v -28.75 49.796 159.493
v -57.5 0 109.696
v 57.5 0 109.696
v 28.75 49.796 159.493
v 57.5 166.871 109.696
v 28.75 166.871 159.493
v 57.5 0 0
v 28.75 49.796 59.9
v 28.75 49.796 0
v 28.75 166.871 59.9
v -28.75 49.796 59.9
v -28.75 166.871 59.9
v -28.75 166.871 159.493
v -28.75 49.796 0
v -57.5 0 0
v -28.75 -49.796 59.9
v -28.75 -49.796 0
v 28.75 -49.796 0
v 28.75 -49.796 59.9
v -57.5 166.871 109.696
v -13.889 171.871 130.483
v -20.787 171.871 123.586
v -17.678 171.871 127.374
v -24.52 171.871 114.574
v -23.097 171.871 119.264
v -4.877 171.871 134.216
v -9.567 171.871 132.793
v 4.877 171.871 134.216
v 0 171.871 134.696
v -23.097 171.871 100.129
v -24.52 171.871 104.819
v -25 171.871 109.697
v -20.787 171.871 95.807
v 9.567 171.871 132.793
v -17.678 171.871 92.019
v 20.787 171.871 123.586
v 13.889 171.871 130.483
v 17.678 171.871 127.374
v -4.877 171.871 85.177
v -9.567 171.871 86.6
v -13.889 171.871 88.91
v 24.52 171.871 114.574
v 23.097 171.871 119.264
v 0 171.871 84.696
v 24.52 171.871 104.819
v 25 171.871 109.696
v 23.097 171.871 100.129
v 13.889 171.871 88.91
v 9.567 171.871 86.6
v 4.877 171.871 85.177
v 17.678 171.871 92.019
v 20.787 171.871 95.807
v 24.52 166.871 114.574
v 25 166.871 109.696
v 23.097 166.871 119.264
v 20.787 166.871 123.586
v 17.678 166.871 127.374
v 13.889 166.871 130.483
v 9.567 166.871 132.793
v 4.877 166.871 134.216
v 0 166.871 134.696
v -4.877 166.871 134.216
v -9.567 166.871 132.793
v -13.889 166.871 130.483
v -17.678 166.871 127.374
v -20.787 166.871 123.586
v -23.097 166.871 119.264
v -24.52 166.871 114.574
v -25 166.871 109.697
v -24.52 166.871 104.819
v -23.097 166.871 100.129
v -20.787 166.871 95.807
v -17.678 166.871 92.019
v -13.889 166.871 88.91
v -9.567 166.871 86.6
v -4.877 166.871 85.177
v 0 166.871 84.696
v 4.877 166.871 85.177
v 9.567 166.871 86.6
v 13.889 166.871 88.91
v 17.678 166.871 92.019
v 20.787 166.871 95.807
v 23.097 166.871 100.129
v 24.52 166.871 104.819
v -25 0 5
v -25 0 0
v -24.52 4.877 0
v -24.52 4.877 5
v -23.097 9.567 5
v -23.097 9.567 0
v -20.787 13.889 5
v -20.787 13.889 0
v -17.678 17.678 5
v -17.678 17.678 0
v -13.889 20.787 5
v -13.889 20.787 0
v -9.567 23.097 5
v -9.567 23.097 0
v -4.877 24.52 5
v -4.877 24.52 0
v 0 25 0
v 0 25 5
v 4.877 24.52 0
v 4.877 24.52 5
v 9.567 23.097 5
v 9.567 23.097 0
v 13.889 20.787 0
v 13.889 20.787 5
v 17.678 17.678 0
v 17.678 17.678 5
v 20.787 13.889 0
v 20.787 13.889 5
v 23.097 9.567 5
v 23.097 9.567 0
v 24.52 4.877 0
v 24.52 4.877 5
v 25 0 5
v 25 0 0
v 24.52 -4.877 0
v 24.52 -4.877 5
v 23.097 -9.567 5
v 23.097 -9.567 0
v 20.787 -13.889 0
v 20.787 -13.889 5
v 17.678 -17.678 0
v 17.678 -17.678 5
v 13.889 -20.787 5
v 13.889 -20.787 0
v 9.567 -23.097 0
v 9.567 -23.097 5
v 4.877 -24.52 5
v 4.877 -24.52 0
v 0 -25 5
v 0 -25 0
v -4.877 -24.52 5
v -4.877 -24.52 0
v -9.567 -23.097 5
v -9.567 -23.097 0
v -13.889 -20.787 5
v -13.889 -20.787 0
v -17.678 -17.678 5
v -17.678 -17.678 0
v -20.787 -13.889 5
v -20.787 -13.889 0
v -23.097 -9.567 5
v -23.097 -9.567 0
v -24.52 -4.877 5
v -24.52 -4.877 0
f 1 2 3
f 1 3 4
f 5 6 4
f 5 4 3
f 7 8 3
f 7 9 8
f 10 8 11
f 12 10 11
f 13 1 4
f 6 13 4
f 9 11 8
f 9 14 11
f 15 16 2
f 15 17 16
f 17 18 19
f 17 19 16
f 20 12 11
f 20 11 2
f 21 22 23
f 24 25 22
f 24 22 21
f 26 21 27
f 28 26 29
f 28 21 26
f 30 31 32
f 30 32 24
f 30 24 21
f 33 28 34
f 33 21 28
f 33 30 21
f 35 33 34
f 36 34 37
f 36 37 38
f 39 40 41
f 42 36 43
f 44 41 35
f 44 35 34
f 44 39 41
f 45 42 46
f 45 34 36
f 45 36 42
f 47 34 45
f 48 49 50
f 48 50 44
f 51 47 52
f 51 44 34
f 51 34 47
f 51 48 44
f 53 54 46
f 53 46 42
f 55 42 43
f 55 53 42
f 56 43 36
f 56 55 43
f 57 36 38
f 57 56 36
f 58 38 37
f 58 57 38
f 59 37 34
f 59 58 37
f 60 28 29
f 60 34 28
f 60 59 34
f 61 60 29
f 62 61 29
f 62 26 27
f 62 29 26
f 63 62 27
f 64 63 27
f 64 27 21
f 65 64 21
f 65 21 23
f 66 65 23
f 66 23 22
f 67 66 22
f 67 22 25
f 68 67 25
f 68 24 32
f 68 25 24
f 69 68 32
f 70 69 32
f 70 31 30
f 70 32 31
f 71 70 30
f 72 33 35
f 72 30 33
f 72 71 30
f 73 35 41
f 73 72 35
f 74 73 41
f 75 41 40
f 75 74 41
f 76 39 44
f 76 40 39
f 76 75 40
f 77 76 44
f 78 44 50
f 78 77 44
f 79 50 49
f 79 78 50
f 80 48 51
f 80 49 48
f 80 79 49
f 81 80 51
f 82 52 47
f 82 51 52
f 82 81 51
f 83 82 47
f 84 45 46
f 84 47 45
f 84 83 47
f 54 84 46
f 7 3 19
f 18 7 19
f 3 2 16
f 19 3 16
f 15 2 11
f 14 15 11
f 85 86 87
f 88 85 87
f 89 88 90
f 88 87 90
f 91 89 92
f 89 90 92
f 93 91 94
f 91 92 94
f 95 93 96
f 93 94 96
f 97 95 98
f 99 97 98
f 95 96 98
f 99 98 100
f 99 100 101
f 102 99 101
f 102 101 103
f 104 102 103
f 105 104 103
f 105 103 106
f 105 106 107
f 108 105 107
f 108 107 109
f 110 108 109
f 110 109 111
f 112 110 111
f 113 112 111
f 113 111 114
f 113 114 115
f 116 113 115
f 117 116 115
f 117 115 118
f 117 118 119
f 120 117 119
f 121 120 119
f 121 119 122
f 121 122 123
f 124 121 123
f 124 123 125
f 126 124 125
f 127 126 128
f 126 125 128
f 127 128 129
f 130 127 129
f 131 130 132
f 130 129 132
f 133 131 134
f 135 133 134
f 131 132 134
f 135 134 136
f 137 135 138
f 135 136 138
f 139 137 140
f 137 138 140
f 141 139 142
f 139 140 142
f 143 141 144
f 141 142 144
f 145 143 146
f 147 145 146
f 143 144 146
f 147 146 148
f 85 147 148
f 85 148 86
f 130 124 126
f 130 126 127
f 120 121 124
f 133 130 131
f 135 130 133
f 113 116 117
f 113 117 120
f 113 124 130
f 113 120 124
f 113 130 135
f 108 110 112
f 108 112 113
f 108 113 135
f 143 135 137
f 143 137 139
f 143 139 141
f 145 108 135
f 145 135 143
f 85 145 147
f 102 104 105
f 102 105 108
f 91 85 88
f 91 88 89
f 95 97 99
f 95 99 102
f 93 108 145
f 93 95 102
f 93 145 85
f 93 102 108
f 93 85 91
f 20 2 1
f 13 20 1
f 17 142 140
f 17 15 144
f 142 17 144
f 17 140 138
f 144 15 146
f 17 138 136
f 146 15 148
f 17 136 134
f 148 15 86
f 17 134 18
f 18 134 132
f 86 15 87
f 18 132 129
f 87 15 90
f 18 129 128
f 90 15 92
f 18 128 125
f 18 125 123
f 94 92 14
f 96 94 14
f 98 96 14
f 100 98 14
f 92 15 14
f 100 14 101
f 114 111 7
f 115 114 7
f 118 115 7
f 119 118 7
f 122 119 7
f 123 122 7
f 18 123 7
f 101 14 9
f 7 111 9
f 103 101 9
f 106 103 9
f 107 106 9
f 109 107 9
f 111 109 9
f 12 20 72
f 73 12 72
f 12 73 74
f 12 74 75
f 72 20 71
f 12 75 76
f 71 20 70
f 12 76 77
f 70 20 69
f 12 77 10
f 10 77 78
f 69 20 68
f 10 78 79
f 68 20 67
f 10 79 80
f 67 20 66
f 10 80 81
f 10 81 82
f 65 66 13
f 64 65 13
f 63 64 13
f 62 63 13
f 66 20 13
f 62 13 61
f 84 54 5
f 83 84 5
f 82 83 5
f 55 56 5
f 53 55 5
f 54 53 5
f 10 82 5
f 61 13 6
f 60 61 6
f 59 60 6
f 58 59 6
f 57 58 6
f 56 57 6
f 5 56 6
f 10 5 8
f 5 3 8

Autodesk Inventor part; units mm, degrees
ref_plane "YZ Plane" through (0, 0, 0) normal (1, 0, 0) x (0, 1, 0)
ref_plane "XZ Plane" through (0, 0, 0) normal (0, 1, 0) x (-1, 0, 0)
ref_plane "XY Plane" through (0, 0, 0) normal (0, 0, 1) x (1, 0, 0)
sketch "Sketch1" plane through (0, 0, 0) normal (0, 0, 1) x (1, 0, 0)
  line L0 (57.5, 0) -> (28.75, -49.7965)
  line L1 (28.75, -49.7965) -> (-28.75, -49.7965)
  line L2 (-28.75, -49.7965) -> (-57.5, 0)
  line L3 (-57.5, 0) -> (-28.75, 49.7965)
  line L4 (-28.75, 49.7965) -> (28.75, 49.7965)
  line L5 (28.75, 49.7965) -> (57.5, 0)
  point P0 (0, 0)
  point P1 (0, 0)
  dimension "d0" = 115
extrude "Extrusion1" add sketch "Sketch1" along normal blind 159.4929
sketch "Sketch2" plane through (-28.75, -49.7965, 0) normal (0, -1, 0) x (1, 0, 0)
  line L0 (-28.75, 109.6965) -> (0, 159.4929)
  line L1 (0, 159.4929) -> (57.5, 159.4929)
  line L2 (57.5, 159.4929) -> (86.25, 109.6965)
  line L3 (86.25, 109.6965) -> (57.5, 59.9)
  line L4 (57.5, 59.9) -> (0, 59.9)
  line L5 (0, 59.9) -> (-28.75, 109.6965)
  line L6 (0, 159.4929) -> (57.5, 159.4929) projected
  point P0 (28.75, 0)
  point P1 (28.75, 109.6965)
  point P2 (28.75, 159.4929)
  dimension "d3" = 115
extrude "Extrusion2" add sketch "Sketch2" against normal blind 216.6673
sketch "Sketch9" plane through (0, 0, 0) normal (1, 0, 0) x (0, 1, 0)
  line L0 (0, 109.6965) -> (-49.7965, 59.9) projected
  line L1 (-49.7965, 109.6965) -> (0, 109.6965) projected
  line L2 (-49.7965, 59.9) -> (-49.7965, 109.6965) projected
  line L3 (-49.7965, 159.4929) -> (0, 109.6965) projected
  line L4 (-49.7965, 109.6965) -> (-49.7965, 159.4929) projected
  line L5 (-49.7965, 109.6965) -> (0, 109.6965) projected
  line L6 (-49.7965, 159.4929) -> (0, 109.6965) projected
  line L7 (0, 109.6965) -> (0, 159.4929) projected
  line L8 (-49.7965, 159.4929) -> (0, 159.4929) projected
  line L9 (0, 109.6965) -> (49.7965, 159.4929) projected
  line L10 (0, 159.4929) -> (49.7965, 159.4929) projected
  line L11 (0, 109.6965) -> (0, 159.4929) projected
  point P0 (0, 0)
extrude "Extrusion8" cut sketch "Sketch9" along normal through all both and the other way through all
sketch "Sketch10" plane through (0, 0, 0) normal (0, 0, -1) x (-1, 0, 0)
  circle A0 centre (0, 0) radius 25
  dimension "d24" = 50
extrude "Extrusion9" cut sketch "Sketch10" against normal blind 5
sketch "Sketch11" plane through (-28.75, 166.8708, 0) normal (0, 1, 0) x (1, 0, 0)
  line L0 (0, -59.9) -> (-28.75, -109.6965) projected
  line L1 (-28.75, -109.6965) -> (0, -159.4929) projected
  line L2 (0, -159.4929) -> (57.5, -159.4929) projected
  line L3 (57.5, -159.4929) -> (86.25, -109.6965) projected
  line L4 (86.25, -109.6965) -> (57.5, -59.9) projected
  line L5 (57.5, -59.9) -> (0, -59.9) projected
  circle A0 centre (28.75, -109.6965) radius 25
  point P0 (28.75, 0)
  point P1 (28.75, -159.4929)
  dimension "d27" = 50
extrude "Extrusion10" add sketch "Sketch11" along normal blind 5 contours A0
properties part number "link_a0" material "ABS Plastic"
